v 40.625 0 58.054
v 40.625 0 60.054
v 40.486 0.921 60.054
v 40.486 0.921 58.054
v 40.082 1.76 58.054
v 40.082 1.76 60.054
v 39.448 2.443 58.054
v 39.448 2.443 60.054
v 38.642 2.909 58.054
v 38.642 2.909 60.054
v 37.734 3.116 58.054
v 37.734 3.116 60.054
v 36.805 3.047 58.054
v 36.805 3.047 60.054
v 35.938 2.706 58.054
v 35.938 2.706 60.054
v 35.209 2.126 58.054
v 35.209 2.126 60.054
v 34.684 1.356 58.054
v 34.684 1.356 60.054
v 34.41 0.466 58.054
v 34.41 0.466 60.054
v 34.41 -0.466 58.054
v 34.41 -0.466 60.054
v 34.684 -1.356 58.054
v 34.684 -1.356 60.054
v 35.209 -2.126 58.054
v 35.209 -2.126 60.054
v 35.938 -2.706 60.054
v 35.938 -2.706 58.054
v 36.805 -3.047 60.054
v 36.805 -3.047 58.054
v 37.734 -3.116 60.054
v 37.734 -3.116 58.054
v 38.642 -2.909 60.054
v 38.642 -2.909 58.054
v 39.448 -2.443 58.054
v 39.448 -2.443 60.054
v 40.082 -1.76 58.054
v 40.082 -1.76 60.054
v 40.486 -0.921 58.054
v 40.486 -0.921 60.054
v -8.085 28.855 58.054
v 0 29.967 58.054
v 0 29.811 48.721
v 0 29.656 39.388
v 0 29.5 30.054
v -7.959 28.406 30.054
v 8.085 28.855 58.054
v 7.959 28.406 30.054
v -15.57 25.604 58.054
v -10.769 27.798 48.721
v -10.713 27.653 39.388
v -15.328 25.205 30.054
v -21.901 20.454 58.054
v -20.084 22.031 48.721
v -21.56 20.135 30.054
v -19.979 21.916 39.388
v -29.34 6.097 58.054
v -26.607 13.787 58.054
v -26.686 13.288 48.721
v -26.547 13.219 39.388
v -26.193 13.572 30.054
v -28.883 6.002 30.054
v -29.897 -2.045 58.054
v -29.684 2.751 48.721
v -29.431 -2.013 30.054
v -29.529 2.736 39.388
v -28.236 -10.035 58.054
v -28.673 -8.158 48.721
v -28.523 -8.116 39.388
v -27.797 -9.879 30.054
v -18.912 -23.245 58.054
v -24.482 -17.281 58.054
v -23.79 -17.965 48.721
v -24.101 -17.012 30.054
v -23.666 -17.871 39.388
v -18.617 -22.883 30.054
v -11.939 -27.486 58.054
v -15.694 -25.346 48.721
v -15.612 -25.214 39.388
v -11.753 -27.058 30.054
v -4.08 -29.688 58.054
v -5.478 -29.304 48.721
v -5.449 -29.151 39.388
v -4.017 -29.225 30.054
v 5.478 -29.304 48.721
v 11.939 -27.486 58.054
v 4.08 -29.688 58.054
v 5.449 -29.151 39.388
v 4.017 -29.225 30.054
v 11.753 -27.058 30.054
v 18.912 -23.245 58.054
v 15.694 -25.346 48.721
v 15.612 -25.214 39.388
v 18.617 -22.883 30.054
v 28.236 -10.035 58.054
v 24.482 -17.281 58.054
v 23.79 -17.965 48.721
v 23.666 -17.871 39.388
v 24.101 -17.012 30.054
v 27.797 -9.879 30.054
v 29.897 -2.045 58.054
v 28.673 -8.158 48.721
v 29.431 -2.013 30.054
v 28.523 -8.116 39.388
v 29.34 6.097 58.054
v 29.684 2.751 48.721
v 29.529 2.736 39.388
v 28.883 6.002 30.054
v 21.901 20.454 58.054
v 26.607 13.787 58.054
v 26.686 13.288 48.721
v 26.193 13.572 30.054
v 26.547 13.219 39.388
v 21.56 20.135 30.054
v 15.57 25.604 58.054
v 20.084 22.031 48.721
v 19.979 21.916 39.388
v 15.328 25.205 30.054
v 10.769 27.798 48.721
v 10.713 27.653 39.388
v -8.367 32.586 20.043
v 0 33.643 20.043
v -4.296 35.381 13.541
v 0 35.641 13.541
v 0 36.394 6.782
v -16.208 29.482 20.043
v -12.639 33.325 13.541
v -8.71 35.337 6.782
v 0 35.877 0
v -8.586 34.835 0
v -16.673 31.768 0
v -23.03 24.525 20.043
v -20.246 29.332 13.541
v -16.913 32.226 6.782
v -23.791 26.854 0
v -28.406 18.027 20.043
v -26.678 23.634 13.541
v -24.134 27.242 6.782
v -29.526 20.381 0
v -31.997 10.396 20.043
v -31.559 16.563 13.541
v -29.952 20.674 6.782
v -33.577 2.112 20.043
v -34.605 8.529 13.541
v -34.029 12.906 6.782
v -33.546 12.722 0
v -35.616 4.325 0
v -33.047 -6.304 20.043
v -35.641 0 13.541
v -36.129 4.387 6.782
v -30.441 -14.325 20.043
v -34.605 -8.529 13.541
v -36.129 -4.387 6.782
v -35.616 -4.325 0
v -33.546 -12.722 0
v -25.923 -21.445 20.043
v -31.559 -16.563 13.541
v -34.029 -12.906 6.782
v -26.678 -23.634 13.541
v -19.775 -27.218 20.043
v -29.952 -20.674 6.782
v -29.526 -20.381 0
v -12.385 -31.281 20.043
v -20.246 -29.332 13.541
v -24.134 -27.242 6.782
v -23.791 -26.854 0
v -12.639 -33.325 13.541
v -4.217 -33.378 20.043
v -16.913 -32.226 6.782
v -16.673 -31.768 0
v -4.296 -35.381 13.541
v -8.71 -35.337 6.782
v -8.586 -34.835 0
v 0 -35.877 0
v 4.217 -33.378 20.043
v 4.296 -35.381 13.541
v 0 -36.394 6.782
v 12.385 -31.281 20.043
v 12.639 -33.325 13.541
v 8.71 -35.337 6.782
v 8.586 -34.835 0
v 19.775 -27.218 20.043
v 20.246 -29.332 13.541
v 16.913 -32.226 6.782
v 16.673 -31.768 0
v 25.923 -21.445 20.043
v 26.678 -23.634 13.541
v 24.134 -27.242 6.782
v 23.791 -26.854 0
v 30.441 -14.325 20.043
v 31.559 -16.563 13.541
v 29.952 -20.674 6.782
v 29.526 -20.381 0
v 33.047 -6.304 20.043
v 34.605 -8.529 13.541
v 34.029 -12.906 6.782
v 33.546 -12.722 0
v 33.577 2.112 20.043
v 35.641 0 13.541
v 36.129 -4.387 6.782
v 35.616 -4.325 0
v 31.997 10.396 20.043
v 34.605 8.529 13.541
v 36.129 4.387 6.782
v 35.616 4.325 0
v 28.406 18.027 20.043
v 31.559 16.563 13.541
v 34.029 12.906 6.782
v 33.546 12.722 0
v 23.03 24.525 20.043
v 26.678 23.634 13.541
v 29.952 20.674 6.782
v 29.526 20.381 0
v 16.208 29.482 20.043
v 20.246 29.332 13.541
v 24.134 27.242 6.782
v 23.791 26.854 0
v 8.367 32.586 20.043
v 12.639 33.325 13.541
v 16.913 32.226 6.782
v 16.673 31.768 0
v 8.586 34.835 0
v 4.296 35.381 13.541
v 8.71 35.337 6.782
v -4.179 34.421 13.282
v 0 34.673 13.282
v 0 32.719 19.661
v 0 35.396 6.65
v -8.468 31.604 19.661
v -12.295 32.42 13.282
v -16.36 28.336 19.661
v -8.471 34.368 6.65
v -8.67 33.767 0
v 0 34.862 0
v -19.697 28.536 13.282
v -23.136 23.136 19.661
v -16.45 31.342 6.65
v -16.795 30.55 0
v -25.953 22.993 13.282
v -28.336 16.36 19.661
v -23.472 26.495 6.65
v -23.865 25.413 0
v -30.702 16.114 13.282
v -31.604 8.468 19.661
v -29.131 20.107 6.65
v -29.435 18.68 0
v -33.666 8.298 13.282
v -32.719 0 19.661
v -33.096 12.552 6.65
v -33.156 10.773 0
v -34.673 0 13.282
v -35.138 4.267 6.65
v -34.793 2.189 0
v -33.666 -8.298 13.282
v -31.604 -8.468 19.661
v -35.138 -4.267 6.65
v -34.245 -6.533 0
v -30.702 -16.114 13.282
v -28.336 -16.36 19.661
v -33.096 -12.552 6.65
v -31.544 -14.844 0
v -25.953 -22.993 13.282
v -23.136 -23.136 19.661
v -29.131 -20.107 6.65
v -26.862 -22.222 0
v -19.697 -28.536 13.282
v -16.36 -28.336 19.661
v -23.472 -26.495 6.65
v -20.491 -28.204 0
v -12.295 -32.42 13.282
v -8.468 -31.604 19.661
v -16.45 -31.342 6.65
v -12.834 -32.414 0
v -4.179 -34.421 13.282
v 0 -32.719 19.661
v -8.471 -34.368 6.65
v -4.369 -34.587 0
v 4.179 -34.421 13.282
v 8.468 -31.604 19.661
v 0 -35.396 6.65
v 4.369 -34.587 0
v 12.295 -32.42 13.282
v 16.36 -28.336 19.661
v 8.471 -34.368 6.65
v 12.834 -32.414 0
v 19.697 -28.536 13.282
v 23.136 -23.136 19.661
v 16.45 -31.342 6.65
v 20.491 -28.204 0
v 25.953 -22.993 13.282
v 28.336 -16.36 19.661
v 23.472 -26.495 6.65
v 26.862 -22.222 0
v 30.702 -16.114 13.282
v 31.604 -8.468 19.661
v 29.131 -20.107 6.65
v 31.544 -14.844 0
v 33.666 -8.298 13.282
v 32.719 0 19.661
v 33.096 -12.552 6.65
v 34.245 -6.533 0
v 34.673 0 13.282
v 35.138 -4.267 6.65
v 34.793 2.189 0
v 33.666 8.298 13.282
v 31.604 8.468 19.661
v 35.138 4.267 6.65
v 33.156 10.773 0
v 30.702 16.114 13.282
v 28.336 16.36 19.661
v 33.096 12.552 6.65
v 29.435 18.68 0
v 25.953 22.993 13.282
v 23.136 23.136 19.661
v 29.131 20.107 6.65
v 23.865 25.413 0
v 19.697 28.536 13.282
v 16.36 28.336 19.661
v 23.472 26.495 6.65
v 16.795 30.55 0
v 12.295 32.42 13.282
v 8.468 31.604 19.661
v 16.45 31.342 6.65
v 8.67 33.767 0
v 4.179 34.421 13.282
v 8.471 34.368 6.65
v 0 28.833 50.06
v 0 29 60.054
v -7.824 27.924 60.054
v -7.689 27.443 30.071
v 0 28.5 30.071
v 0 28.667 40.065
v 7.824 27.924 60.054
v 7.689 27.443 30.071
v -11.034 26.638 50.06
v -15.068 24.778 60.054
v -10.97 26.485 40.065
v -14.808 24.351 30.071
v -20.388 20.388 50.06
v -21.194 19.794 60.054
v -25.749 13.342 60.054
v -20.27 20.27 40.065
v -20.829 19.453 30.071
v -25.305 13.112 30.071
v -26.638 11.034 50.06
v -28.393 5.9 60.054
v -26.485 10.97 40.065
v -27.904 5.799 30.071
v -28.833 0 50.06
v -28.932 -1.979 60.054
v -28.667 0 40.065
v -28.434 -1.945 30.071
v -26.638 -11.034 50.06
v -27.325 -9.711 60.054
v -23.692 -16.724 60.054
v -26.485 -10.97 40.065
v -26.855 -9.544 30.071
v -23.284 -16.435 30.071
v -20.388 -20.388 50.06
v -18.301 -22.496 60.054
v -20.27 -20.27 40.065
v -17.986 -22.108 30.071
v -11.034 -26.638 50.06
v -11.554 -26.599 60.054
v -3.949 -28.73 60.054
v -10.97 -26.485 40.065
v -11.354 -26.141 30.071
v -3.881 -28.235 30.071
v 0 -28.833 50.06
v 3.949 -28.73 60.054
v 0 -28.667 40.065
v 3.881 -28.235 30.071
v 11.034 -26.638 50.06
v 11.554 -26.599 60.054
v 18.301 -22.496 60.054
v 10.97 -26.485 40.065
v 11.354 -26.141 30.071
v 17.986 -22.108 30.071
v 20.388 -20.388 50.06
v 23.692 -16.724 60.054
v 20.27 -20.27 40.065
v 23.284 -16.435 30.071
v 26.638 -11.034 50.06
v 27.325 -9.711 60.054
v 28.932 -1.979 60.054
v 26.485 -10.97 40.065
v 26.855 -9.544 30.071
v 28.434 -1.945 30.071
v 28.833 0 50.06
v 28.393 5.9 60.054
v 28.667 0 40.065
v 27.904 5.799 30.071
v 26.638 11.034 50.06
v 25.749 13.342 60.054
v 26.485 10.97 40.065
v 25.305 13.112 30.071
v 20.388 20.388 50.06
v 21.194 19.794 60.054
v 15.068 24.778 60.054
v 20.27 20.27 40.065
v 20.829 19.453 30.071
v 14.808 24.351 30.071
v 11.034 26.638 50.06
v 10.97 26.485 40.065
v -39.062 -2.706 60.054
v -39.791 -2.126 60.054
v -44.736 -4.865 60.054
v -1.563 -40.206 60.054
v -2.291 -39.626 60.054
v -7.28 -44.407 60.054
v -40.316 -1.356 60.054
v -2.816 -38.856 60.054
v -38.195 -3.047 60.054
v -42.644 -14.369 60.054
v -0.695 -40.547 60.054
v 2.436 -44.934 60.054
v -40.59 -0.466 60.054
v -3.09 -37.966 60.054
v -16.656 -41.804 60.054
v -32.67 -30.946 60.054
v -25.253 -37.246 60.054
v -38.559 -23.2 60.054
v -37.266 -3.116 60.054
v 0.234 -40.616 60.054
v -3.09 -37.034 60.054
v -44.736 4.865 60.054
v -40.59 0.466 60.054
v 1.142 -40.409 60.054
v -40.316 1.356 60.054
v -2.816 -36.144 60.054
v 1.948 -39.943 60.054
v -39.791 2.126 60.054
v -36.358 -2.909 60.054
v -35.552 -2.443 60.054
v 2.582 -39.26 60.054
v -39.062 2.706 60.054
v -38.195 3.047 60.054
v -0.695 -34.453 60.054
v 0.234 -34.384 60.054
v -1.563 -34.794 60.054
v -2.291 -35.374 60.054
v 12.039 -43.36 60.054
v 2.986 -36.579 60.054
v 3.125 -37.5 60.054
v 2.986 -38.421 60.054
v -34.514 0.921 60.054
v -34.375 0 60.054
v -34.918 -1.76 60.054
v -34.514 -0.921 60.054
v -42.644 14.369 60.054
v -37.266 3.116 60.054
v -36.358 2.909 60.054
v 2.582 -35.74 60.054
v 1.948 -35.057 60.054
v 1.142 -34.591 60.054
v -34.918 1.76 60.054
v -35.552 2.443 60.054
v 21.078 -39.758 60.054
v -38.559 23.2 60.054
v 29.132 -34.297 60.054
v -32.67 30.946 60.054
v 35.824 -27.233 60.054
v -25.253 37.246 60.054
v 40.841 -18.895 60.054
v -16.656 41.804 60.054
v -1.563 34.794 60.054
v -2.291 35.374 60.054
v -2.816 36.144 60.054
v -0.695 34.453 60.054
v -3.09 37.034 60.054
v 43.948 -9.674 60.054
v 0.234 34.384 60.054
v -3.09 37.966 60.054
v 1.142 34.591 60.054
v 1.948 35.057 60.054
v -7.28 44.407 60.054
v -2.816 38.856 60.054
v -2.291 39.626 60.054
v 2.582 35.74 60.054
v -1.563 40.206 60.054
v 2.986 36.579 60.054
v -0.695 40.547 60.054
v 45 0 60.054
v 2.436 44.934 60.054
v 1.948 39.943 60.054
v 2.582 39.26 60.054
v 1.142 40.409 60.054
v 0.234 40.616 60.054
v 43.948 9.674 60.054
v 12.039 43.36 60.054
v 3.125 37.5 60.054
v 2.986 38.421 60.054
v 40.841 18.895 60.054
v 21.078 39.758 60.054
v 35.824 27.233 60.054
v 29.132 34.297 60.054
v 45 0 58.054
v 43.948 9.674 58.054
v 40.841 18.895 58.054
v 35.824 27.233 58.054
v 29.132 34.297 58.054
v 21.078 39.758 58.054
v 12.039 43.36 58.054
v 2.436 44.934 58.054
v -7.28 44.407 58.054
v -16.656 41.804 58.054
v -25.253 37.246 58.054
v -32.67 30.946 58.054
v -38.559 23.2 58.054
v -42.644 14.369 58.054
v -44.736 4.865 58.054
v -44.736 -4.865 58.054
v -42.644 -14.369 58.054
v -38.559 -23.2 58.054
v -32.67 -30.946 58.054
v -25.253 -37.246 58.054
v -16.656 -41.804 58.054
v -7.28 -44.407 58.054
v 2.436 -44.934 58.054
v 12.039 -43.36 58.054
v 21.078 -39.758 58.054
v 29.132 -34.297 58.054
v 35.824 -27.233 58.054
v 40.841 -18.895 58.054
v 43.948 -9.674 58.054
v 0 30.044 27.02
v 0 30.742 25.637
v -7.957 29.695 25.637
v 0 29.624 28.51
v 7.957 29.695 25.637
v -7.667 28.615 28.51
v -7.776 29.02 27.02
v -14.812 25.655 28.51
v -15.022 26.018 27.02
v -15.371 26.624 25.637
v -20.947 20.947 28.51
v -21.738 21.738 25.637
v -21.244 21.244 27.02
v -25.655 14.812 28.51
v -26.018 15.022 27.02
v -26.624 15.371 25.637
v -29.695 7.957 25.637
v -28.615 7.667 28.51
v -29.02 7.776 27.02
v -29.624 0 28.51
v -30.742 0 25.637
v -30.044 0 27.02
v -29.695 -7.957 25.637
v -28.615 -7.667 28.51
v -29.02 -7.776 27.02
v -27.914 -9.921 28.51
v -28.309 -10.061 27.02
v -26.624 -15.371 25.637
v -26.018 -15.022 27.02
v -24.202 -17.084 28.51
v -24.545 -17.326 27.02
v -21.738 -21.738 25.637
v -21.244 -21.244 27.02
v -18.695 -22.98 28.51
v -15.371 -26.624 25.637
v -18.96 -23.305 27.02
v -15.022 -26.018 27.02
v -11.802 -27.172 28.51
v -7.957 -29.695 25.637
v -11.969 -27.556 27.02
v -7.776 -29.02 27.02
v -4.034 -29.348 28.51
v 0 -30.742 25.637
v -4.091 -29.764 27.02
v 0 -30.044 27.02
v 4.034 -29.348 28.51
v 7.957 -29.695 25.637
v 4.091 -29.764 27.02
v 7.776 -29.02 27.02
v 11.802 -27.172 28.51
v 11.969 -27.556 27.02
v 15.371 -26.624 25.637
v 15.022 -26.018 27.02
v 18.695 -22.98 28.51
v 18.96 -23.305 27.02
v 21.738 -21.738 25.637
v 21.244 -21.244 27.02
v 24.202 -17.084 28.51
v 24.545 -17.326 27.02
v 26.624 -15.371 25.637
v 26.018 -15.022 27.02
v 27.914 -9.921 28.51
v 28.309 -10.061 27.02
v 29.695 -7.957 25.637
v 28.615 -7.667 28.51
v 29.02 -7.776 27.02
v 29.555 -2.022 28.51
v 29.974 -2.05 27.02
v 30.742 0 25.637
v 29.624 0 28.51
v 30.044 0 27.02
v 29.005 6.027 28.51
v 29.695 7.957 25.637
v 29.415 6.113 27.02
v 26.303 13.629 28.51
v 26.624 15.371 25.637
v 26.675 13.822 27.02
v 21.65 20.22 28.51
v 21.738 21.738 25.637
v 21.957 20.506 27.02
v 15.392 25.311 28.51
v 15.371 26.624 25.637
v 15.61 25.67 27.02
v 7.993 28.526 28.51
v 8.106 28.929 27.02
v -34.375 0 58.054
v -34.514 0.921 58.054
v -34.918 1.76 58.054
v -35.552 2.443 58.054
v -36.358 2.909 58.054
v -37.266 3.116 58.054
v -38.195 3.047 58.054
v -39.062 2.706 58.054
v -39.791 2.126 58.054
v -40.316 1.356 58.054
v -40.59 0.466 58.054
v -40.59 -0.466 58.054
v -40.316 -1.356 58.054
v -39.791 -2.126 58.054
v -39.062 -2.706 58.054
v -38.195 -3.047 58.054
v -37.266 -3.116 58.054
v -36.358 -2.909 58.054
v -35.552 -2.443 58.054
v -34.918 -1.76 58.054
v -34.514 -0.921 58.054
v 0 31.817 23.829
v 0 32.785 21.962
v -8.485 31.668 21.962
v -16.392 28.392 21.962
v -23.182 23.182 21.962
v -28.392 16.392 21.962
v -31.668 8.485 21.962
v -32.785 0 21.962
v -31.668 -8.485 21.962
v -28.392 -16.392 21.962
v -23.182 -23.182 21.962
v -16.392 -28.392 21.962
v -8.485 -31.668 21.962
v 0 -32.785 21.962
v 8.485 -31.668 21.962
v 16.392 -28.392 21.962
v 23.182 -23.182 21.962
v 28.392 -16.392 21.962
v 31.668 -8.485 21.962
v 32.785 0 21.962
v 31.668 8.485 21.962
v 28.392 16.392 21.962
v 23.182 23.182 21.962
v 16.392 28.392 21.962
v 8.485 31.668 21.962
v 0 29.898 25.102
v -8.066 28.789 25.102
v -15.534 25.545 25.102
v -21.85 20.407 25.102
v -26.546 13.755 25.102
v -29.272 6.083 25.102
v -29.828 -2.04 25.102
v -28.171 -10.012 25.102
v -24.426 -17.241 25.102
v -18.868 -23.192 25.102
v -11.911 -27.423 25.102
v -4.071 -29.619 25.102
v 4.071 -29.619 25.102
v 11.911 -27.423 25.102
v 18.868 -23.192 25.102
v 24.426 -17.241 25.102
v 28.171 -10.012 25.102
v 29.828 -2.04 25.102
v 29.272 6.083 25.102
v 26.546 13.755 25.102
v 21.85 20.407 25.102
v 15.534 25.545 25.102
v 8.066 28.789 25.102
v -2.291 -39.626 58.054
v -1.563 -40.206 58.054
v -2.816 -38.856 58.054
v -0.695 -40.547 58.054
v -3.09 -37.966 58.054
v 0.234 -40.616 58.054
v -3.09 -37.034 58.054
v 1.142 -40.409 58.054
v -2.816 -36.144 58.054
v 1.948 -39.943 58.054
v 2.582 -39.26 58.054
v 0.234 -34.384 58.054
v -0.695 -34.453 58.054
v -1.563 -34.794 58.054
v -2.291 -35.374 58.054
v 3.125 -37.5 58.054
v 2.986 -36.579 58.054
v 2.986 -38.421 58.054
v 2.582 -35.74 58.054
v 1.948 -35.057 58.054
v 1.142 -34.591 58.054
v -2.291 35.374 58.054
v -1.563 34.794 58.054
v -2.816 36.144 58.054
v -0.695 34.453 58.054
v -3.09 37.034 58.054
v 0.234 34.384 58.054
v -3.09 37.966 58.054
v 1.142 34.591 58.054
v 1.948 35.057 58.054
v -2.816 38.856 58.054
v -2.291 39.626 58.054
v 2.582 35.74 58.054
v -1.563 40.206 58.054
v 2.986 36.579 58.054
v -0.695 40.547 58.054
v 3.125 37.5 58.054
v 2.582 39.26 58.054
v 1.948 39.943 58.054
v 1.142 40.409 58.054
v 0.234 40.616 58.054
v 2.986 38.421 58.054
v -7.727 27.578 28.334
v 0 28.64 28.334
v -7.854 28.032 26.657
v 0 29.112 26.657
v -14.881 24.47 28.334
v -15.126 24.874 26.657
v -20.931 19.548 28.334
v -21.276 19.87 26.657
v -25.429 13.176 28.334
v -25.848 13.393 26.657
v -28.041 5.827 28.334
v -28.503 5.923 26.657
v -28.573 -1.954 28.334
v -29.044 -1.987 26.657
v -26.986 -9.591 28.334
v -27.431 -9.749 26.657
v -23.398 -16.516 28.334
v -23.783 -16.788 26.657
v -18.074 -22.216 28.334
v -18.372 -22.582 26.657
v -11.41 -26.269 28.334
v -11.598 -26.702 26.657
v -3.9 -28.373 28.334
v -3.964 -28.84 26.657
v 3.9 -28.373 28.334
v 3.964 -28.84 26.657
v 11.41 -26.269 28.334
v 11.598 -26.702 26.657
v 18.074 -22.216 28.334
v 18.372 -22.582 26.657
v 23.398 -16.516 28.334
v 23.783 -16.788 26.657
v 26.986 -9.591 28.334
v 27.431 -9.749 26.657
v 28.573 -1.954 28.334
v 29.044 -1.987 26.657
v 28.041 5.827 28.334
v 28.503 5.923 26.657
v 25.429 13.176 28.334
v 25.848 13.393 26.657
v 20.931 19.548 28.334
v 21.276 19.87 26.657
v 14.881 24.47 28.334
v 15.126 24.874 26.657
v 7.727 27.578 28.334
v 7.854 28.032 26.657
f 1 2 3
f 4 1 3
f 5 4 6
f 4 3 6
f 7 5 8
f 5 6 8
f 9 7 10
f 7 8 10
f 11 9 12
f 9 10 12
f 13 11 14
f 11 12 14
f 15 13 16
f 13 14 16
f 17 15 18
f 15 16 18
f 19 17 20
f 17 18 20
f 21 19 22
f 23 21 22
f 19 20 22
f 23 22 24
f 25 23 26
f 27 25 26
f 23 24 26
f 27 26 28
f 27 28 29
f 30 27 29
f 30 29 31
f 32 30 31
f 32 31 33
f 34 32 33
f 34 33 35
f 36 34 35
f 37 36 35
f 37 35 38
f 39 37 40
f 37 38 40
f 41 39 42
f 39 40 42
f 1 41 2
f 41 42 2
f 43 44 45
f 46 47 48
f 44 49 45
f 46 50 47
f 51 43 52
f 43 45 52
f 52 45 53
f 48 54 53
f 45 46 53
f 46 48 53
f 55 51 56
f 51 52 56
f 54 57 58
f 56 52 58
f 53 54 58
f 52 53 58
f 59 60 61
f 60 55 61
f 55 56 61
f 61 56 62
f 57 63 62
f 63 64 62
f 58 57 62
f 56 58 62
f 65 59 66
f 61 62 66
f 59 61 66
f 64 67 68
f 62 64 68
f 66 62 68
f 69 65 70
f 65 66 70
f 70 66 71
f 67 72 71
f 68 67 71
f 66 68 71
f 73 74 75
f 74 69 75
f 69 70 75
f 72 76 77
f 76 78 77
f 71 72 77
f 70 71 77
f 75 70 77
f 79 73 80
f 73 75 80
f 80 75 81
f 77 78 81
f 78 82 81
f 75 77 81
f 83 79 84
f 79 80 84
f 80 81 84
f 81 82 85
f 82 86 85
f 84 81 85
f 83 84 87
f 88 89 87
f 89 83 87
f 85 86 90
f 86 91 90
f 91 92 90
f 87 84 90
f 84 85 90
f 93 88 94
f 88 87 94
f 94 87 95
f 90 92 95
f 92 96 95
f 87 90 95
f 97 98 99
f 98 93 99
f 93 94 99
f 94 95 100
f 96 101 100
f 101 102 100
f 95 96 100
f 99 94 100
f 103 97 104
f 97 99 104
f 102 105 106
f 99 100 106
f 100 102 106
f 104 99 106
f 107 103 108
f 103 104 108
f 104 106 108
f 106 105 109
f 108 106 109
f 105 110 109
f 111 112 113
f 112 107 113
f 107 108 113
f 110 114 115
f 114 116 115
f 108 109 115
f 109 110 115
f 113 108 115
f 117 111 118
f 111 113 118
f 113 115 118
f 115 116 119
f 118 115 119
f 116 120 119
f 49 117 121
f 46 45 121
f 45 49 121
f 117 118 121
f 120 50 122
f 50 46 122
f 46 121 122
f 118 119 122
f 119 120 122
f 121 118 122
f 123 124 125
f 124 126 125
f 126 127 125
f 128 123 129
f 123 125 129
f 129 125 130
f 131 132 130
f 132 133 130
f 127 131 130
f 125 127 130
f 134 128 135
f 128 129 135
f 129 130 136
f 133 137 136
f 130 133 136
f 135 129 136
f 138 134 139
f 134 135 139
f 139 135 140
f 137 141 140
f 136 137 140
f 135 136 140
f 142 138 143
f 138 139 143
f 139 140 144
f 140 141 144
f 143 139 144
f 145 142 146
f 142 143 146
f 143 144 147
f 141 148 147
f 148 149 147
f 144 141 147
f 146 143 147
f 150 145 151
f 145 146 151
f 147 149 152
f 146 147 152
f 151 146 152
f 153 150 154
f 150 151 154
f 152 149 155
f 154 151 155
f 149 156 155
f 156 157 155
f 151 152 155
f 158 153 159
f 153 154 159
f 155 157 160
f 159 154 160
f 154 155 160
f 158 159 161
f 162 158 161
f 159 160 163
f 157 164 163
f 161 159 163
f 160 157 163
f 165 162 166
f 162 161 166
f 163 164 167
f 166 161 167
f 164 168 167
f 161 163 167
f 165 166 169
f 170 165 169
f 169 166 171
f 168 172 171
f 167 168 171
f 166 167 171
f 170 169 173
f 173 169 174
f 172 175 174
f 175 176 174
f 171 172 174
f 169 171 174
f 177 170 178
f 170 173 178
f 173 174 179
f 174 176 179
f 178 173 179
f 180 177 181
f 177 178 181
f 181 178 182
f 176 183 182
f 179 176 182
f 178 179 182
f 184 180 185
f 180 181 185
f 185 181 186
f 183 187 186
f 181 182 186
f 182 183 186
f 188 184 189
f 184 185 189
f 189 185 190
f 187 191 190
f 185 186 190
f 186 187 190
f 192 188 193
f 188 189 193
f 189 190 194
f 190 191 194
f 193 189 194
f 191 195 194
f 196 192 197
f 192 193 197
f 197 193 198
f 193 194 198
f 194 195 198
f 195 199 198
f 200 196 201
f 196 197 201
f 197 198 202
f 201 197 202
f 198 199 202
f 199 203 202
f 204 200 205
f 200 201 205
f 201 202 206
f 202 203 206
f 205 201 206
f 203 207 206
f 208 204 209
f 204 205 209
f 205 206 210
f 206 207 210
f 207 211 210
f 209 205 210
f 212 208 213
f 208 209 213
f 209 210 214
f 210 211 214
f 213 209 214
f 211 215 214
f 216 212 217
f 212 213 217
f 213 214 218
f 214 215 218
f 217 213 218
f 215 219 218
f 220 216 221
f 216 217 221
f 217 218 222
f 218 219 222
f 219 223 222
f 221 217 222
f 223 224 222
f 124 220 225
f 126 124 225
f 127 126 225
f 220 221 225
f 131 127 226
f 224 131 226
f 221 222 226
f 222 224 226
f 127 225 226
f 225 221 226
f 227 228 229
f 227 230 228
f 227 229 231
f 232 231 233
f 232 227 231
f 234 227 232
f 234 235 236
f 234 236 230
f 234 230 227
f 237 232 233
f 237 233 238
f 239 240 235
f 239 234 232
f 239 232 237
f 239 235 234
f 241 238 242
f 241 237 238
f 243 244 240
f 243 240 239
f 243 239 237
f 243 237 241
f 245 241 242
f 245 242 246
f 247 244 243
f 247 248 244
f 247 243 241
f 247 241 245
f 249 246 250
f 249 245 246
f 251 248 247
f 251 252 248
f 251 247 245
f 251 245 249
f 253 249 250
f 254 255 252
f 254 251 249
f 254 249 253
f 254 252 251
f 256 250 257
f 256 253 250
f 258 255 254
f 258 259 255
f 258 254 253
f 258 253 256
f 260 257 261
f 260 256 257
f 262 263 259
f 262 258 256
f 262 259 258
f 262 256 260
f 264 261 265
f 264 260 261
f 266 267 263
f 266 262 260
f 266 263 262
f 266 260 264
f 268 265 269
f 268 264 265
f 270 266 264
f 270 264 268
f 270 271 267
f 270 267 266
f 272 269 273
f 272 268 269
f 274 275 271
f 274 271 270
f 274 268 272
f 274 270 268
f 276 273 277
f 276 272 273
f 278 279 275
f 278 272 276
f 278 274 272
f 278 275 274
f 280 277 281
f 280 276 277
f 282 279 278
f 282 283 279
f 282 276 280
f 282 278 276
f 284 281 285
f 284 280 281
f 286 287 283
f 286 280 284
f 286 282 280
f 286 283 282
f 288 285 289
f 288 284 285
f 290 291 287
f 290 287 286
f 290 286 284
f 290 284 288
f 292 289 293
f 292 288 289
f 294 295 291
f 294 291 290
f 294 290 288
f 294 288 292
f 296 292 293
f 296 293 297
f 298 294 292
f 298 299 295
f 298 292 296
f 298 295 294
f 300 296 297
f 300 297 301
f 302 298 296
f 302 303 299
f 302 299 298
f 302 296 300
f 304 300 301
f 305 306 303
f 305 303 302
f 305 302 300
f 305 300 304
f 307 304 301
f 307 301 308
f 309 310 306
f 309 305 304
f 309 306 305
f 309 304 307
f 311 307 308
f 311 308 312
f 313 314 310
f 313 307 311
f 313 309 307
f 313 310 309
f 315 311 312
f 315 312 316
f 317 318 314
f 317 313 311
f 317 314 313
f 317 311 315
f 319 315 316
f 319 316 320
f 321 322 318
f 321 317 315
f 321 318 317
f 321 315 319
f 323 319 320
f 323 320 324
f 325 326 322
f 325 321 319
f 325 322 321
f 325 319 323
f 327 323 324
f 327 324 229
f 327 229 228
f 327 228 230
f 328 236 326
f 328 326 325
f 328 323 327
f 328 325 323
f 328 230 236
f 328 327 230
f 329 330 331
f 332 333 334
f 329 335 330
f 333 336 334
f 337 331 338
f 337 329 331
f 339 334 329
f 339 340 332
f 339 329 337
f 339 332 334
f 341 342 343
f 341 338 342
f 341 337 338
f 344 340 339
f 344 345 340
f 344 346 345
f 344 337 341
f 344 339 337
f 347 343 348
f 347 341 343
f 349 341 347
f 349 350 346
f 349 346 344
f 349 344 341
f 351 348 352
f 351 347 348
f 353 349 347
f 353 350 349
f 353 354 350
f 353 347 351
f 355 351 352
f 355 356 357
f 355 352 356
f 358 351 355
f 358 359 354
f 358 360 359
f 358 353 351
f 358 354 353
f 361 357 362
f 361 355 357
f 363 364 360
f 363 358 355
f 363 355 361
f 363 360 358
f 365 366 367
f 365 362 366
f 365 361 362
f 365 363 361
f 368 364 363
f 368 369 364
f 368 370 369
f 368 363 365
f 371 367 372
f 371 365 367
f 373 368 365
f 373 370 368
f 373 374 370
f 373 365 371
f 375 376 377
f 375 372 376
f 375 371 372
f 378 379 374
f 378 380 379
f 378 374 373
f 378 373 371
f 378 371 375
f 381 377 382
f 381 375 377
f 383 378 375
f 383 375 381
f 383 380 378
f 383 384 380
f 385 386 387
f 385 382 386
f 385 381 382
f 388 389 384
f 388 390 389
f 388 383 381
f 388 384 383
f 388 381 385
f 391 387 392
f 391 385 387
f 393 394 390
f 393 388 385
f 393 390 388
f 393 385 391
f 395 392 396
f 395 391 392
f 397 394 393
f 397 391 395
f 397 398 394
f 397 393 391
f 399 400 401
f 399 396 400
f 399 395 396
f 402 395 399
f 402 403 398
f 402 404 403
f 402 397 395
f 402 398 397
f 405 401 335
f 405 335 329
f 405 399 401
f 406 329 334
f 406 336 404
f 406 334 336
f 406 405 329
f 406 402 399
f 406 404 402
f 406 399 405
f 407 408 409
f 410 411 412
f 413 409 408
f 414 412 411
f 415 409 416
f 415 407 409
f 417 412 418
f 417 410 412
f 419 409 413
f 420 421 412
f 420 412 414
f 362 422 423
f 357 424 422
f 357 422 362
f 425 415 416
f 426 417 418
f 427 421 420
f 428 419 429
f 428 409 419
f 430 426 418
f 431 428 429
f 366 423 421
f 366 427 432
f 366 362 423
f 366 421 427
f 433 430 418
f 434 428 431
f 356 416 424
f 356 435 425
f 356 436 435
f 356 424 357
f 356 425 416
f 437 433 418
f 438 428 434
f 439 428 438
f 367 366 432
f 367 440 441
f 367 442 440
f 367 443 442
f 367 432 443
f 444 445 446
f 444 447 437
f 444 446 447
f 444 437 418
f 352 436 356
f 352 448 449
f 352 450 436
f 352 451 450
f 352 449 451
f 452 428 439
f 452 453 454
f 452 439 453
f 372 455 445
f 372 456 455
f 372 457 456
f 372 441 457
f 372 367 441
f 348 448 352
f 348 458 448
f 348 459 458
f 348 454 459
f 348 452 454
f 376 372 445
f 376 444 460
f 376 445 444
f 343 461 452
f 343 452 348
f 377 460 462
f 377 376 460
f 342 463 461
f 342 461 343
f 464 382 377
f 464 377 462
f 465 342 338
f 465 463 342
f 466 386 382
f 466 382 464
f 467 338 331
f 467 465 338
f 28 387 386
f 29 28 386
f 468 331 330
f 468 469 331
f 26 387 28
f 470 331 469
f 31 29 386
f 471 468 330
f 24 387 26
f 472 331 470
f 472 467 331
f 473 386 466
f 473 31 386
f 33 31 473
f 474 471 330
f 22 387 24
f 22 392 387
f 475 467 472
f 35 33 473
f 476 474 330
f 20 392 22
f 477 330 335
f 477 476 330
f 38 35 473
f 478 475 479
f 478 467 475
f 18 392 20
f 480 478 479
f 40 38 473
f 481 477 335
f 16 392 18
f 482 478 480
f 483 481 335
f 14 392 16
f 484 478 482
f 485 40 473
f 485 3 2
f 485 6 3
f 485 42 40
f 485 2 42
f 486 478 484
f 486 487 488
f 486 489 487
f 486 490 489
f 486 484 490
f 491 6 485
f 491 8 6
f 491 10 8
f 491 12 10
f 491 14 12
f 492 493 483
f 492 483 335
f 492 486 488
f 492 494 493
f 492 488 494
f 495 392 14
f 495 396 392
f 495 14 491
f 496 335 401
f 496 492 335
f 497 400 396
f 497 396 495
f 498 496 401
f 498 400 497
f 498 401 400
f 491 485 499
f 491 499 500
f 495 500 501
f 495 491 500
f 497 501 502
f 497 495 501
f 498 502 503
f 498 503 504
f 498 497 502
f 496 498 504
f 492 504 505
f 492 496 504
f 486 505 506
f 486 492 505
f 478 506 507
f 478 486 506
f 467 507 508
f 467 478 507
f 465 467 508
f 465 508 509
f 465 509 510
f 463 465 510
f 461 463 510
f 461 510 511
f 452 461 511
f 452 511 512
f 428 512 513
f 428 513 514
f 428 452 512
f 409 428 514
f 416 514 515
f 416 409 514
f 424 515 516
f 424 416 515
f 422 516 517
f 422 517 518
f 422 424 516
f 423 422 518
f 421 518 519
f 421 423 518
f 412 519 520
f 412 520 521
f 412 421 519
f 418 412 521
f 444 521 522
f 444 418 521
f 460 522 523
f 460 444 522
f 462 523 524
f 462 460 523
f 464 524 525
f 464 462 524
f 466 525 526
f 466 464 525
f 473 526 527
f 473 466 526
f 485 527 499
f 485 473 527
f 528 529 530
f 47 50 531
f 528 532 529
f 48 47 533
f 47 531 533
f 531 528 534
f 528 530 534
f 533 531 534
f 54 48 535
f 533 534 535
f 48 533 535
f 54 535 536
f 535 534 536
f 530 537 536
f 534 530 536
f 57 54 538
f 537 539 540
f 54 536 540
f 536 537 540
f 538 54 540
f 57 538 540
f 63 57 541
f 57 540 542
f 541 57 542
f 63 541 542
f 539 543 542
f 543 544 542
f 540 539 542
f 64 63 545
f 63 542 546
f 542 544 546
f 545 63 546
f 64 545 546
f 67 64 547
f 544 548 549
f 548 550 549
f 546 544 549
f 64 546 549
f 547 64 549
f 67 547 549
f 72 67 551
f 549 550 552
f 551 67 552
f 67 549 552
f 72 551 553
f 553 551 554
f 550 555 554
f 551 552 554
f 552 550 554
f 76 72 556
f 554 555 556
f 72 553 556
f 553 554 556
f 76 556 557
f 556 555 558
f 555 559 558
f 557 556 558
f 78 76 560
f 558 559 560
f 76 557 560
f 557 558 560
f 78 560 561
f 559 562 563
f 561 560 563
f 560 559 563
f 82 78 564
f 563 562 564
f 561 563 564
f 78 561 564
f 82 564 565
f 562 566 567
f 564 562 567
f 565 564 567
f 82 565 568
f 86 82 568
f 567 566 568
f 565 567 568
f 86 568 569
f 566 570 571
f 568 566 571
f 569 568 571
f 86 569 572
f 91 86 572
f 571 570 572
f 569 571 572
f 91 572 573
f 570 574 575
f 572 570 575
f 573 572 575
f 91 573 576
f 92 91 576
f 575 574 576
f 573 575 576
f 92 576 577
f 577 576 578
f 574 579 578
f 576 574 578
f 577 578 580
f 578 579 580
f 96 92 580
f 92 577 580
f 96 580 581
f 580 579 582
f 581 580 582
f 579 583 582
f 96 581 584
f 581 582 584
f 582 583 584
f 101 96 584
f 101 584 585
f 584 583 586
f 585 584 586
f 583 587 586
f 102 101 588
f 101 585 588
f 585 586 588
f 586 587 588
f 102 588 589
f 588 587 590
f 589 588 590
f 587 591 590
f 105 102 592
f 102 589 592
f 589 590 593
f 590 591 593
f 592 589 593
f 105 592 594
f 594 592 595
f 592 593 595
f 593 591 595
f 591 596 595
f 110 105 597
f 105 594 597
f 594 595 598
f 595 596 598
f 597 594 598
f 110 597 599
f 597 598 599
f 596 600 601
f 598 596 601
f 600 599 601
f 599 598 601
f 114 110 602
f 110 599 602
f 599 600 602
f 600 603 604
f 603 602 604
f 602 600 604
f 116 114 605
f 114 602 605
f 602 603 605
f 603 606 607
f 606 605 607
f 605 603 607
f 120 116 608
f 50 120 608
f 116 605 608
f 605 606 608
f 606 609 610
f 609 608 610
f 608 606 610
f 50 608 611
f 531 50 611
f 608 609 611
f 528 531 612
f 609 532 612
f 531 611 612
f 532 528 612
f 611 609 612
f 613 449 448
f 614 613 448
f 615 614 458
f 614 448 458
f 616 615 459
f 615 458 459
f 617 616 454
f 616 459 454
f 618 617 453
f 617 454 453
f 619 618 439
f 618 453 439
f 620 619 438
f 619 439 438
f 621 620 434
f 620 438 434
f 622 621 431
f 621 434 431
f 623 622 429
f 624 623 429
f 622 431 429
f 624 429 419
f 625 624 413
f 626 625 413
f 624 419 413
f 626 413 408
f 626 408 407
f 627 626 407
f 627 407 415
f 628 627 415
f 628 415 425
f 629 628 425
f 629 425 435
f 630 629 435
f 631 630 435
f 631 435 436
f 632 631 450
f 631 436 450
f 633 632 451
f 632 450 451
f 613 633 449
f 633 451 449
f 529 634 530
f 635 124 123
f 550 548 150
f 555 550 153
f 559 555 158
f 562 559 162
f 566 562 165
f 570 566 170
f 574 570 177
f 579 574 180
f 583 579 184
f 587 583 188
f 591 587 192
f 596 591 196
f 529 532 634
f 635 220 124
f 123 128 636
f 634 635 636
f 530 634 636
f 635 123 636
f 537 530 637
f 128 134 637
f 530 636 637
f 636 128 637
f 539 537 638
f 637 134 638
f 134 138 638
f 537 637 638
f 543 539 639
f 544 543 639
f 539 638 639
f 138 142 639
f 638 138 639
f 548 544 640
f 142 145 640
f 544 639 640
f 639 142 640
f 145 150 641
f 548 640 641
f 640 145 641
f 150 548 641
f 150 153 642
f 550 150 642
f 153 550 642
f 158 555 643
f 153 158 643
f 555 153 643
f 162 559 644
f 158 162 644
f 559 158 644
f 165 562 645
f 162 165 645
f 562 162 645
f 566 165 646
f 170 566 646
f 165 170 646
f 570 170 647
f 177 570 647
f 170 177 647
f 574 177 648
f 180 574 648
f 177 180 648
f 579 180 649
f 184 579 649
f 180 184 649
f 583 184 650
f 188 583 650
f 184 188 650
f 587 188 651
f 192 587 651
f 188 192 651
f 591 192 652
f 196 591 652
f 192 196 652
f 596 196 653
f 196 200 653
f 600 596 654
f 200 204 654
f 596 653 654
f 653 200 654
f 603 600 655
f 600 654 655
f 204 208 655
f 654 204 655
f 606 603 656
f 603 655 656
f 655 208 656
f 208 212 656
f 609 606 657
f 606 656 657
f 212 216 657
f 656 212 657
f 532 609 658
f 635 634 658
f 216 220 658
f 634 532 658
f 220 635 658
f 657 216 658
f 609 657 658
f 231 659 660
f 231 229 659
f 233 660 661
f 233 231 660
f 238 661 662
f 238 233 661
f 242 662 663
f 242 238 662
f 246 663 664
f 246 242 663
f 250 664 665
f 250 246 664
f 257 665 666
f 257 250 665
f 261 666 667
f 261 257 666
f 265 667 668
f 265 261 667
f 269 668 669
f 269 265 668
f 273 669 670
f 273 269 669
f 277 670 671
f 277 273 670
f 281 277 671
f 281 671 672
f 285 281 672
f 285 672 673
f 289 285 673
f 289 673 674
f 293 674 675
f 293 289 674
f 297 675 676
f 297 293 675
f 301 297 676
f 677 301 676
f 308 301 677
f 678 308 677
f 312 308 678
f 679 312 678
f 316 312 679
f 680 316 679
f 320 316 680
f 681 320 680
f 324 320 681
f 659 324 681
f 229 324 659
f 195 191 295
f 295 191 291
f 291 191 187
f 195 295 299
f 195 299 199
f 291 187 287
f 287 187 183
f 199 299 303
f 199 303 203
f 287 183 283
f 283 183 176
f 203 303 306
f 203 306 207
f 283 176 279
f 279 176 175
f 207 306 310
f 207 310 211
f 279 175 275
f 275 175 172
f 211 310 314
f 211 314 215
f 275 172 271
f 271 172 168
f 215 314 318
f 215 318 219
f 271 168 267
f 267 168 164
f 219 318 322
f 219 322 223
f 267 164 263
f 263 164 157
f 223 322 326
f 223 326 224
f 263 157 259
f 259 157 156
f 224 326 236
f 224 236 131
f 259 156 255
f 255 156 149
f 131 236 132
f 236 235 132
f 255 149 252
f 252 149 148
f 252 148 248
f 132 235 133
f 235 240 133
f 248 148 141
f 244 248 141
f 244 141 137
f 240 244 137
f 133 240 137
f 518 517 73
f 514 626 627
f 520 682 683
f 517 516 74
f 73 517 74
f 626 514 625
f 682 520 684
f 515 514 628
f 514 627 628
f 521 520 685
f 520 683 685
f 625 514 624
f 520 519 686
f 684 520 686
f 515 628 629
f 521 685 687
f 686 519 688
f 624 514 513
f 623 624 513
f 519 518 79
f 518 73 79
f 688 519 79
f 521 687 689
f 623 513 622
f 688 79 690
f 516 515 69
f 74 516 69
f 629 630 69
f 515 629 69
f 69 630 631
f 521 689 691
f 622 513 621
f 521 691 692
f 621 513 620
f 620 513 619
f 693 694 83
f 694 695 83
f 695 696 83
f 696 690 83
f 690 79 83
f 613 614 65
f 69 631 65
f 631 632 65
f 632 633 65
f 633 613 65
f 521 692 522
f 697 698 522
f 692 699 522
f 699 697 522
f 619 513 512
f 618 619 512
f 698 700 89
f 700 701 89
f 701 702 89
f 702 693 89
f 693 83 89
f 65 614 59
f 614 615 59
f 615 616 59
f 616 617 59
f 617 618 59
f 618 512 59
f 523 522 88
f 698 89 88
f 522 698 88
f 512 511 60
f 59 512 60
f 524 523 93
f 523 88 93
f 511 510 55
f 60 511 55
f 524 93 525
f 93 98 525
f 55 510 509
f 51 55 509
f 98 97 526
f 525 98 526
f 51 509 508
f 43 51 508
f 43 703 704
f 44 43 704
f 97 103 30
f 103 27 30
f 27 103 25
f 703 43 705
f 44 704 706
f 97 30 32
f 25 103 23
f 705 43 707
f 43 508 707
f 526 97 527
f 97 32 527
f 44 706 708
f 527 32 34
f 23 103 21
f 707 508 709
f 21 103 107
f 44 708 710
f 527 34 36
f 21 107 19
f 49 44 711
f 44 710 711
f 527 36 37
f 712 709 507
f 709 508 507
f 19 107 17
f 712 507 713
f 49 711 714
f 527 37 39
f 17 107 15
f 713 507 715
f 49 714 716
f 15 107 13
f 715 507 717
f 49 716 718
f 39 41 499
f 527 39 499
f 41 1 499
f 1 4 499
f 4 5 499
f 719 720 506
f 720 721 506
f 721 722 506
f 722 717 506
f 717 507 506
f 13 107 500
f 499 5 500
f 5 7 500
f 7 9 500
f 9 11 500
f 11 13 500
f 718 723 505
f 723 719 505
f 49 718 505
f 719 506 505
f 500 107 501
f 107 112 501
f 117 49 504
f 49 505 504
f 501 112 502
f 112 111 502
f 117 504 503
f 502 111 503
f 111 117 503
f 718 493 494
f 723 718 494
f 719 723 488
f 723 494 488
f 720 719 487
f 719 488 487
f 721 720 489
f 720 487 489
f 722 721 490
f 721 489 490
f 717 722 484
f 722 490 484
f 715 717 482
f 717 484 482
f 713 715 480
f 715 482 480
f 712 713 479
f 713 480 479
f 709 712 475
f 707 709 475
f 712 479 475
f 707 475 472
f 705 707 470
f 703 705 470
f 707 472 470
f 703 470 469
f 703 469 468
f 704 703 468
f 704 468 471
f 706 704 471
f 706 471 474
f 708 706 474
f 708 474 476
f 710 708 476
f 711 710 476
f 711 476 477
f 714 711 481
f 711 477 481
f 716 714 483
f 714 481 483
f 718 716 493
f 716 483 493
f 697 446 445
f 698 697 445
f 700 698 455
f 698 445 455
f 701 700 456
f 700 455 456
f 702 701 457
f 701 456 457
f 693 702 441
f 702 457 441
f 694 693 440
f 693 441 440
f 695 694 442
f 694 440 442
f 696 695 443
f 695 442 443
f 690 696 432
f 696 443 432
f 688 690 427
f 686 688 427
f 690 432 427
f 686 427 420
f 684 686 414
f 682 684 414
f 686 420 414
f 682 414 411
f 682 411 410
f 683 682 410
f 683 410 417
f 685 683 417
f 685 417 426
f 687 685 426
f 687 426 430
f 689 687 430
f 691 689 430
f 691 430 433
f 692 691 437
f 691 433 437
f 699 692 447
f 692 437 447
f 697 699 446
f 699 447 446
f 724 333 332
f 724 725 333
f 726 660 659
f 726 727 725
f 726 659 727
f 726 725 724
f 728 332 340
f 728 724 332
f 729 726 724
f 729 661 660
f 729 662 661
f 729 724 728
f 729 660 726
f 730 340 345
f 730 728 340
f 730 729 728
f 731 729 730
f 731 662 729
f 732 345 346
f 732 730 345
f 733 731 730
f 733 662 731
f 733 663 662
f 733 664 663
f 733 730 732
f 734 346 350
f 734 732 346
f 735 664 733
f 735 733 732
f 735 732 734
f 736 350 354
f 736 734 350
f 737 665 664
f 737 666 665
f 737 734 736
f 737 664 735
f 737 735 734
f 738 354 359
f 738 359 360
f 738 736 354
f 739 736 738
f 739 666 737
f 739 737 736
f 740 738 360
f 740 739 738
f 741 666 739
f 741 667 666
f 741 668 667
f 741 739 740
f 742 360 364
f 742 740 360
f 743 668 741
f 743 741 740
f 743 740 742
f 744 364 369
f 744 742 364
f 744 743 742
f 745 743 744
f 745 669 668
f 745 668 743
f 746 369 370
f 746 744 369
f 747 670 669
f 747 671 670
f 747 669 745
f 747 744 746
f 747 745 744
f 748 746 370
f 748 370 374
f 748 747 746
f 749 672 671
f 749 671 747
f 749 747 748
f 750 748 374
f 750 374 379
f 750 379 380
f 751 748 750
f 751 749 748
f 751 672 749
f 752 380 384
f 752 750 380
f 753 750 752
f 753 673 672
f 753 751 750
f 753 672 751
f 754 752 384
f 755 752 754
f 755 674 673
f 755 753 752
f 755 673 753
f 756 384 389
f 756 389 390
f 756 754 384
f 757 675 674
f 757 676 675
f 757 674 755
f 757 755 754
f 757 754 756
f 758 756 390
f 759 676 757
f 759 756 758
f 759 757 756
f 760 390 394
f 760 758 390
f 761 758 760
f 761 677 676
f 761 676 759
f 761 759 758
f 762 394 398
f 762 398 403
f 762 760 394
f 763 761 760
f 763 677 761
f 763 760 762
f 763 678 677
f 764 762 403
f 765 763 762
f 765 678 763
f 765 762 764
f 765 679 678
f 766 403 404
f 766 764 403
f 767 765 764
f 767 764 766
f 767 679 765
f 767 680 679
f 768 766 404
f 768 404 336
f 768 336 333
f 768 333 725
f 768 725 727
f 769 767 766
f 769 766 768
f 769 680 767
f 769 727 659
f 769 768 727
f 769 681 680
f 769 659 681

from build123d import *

# Parameters (mm, degrees)
SHELL1_T            = -1
SKETCH2_R           = 45
SKETCH2_R_2         = 3.125
SKETCH2_R_3         = 28.999861121
BOSS_EXTRUDE1_DEPTH = 2


with BuildPart() as part:
    # Sketch1 → Revolve1 (revolve)
    with BuildSketch(Plane(origin=(0, 0, 0), x_dir=(0, 0, -1), z_dir=(1, 0, 0))):
        with BuildLine():
            Line((0, 0), (-50.959835356, 0))
            Line((-50.959835356, 0), (-60.054255014, 0))
            Line((-60.054255014, 0), (-60.054255014, 30))
            Line((-60.054255014, 30), (-30.054255014, 29.5))
            ThreePointArc((-30.054255014, 29.5), (-27.754838856, 29.797720054), (-25.637373582, 30.742332522))
            ThreePointArc((-25.637373582, 30.742332522), (-22.902920152, 32.314145749), (-20.042663952, 33.643343571))
            ThreePointArc((-20.042663952, 33.643343571), (-10.179122164, 36.1760026), (0, 35.877187771))
            Line((0, 35.877187771), (0, 34.862194457))
            Line((0, 34.862194457), (0, 0))
        make_face()
    revolve(axis=Axis((0, 0, 0), (0, 0, 1)))

    # Shell1
    shell1_openings = [part.faces().sort_by_distance(p)[0] for p in [
        (0, 0, 0),
        (0, 0, 60.054255014),
    ]]
    offset(amount=SHELL1_T, openings=shell1_openings, kind=Kind.INTERSECTION)

    # Sketch2 → Boss-Extrude1 (add)
    with BuildSketch(Plane.XY.offset(60.054255014)):
        Circle(SKETCH2_R)
        with Locations((0, 37.5)):
            Circle(SKETCH2_R_2, mode=Mode.SUBTRACT)
        with Locations((37.5, 0)):
            Circle(SKETCH2_R_2, mode=Mode.SUBTRACT)
        with Locations((0, -37.5)):
            Circle(SKETCH2_R_2, mode=Mode.SUBTRACT)
        with Locations((-37.5, 0)):
            Circle(SKETCH2_R_2, mode=Mode.SUBTRACT)
        Circle(SKETCH2_R_3, mode=Mode.SUBTRACT)
    extrude(amount=-BOSS_EXTRUDE1_DEPTH)


solid = part.part
